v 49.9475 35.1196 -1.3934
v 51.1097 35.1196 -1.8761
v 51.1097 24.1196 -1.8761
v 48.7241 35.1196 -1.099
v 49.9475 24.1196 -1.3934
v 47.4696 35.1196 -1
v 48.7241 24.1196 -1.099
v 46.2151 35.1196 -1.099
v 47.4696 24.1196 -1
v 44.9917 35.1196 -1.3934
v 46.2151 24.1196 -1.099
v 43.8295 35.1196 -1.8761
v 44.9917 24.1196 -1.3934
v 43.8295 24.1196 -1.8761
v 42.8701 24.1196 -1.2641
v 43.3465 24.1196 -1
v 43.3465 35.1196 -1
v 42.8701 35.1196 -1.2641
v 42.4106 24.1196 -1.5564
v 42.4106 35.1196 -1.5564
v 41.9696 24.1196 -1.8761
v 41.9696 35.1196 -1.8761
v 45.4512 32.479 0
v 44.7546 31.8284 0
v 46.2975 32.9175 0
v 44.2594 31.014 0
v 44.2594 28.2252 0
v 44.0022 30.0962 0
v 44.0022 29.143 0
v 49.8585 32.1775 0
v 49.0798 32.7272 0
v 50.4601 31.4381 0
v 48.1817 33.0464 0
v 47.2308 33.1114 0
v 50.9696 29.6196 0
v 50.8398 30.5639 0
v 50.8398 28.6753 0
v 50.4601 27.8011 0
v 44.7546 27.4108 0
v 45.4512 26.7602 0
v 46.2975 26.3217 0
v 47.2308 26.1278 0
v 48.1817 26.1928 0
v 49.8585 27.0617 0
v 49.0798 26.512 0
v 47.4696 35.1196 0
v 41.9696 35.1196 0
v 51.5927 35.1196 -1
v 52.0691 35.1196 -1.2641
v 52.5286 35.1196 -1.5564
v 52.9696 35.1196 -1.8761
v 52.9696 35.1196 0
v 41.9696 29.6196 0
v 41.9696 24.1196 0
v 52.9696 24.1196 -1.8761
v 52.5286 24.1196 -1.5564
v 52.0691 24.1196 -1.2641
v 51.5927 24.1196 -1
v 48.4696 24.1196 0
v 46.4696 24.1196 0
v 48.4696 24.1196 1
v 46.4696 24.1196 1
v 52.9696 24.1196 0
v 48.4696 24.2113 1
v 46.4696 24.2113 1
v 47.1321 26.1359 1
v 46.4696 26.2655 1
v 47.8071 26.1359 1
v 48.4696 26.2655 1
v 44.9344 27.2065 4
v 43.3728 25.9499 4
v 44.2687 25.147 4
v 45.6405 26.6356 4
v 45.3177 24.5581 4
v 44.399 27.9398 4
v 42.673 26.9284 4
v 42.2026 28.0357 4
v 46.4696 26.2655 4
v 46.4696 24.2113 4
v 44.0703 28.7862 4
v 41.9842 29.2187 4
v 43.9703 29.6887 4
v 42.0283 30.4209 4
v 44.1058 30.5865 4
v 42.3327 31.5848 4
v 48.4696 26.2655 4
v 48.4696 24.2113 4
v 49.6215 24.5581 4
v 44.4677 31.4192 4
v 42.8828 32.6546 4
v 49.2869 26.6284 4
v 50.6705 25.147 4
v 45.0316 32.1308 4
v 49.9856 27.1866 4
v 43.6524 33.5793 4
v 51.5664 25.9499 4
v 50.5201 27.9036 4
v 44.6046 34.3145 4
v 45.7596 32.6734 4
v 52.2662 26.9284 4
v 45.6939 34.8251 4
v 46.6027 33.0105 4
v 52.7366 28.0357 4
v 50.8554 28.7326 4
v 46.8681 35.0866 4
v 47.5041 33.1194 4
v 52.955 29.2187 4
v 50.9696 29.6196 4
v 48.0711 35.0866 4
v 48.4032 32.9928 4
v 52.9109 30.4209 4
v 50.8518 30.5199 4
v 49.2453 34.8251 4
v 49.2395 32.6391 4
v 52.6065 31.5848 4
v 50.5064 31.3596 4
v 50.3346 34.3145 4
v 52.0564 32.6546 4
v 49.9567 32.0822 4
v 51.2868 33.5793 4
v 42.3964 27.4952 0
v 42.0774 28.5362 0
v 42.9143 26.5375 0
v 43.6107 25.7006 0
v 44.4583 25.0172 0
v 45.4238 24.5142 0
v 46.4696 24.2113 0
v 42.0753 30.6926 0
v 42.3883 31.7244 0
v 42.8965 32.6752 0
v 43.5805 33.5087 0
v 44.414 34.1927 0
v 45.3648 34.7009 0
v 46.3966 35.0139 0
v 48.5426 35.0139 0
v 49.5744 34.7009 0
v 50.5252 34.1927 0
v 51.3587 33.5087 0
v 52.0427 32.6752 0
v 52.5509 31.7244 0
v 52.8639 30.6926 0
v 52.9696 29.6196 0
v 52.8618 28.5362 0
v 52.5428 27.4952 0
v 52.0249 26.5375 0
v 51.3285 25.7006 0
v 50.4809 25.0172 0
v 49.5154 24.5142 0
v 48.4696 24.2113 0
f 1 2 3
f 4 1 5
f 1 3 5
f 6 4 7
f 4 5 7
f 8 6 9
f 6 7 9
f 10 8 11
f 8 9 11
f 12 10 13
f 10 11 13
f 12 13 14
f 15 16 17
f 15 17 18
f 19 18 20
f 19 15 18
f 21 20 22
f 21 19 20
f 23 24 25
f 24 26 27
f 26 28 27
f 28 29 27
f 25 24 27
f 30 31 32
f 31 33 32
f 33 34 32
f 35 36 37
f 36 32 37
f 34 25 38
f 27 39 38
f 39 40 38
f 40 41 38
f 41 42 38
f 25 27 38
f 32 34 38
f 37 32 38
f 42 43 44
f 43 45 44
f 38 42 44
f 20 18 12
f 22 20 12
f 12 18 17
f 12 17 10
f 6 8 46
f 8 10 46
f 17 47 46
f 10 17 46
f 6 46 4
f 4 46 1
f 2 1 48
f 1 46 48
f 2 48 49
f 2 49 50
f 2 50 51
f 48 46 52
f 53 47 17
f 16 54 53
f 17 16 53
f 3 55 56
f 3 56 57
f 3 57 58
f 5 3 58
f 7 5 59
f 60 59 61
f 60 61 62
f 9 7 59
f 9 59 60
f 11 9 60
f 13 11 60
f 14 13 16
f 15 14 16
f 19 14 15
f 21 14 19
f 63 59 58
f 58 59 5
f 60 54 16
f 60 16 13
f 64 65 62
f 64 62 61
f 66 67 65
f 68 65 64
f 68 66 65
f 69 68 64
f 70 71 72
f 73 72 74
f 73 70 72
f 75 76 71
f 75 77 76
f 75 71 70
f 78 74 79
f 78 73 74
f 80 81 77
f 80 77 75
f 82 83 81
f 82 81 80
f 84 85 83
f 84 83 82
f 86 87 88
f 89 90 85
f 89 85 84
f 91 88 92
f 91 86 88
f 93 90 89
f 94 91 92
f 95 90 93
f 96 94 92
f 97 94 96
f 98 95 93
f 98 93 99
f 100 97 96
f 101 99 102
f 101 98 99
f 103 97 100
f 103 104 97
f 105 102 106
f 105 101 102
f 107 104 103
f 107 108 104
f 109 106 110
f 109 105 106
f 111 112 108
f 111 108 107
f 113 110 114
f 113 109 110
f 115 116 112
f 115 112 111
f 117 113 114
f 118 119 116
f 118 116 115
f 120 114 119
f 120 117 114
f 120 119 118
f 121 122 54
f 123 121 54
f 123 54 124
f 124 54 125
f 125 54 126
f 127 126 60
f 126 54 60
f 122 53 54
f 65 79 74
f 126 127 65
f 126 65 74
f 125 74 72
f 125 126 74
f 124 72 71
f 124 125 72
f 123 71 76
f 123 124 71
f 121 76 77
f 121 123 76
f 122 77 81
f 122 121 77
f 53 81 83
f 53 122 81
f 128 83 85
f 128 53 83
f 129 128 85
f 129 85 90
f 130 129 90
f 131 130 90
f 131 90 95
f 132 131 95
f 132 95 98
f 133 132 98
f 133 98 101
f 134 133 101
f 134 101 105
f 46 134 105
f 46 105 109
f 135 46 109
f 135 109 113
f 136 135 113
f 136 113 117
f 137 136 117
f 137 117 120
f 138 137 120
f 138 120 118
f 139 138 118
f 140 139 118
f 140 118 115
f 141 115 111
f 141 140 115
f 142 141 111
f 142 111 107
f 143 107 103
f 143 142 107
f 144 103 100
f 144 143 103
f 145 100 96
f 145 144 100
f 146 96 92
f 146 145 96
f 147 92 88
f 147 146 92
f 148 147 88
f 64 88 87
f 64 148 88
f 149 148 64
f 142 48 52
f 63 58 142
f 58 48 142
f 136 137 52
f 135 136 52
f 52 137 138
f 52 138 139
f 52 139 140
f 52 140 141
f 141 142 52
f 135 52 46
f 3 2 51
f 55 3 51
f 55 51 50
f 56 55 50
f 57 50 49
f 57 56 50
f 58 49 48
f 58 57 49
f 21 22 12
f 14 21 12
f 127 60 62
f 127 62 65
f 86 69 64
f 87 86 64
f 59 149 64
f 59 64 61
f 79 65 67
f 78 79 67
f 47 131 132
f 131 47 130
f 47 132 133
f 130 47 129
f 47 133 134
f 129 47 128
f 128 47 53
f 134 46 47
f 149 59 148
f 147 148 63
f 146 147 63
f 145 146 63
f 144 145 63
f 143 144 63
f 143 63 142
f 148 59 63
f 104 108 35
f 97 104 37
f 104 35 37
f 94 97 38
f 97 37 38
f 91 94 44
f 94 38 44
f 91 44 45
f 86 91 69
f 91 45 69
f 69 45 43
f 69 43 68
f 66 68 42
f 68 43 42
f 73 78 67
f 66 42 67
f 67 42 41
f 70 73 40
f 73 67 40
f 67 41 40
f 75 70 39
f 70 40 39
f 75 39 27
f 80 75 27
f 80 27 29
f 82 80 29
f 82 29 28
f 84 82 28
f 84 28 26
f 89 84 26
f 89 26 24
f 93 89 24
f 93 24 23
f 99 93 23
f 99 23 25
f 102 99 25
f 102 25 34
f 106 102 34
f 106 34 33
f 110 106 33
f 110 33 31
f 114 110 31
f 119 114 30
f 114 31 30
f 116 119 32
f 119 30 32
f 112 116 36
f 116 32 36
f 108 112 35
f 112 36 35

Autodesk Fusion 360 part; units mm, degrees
sketch "Esquisse1" plane through (0, 0, 0) normal (0, 0, 1) x (1, 0, 0)
  circle A0 centre (47.4696, 29.6196) radius 5.5
  circle A1 centre (47.4696, 29.6196) radius 3.5
  line L0 (47.4696, 29.6196) -> (47.4696, 24.1196)
  line L1 (46.4696, 26.2655) -> (48.4696, 26.2655)
  line L2 (48.4696, 26.2655) -> (48.4696, 24.1196)
  line L3 (48.4696, 24.1196) -> (46.4696, 24.1196)
  line L4 (46.4696, 24.1196) -> (46.4696, 26.2655)
  dimension "d5" = 7
  dimension "d6" = 2
  dimension "d7" = 1
extrude "Extrusion1" add sketch "Esquisse1" along normal blind 4 contours A0 A1 L2 L4
extrude "Extrusion2" add sketch "Esquisse1" along normal blind 1 contours A0 A1 L0 L4 | A0 L3 L4 | A0 L2 L3 | A0 A1 L0 L2
sketch "Esquisse2" plane through (0, 24.1196, 0) normal (0, -1, 0) x (1, 0, 0)
  line L0 (46.4696, 0) -> (48.4696, 0)
  line L1 (48.4696, 0) -> (48.4696, 1)
  line L2 (48.4696, 1) -> (46.4696, 1)
  line L3 (46.4696, 1) -> (46.4696, 0)
  circle A0 centre (47.4696, -9) radius 8
  circle A1 centre (47.4696, -9) radius 9
  line L4 (47.4696, 0) -> (47.4696, -9)
  line L5 (48.4696, 0) -> (46.4696, 0)
  line L6 (43.3465, -1) -> (51.5927, -1)
  line L7 (51.5927, -1) -> (52.9696, 0)
  line L8 (41.9696, 0) -> (43.3465, -1)
  line L9 (47.4696, 0) -> (41.9696, 0)
  line L10 (47.4696, 0) -> (52.9696, 0)
  line L11 (38.9843, -6) -> (55.9549, -6)
  line L12 (41.9696, -1.8761) -> (52.9696, -1.8761)
  dimension "d12" = 1
  dimension "d13" = 16
  dimension "d14" = 5.5
  dimension "d15" = 5.5
  dimension "d16" = 5
extrude "Extrusion3" add sketch "Esquisse2" against normal blind 11 contours L0 A1 L5 L8 L9 | L0 A1 L5 L7 L10 | A1 L4 L6 | A1 L4 L6 | A0 A1 L6 L12 | A0 A1 L6 L12
